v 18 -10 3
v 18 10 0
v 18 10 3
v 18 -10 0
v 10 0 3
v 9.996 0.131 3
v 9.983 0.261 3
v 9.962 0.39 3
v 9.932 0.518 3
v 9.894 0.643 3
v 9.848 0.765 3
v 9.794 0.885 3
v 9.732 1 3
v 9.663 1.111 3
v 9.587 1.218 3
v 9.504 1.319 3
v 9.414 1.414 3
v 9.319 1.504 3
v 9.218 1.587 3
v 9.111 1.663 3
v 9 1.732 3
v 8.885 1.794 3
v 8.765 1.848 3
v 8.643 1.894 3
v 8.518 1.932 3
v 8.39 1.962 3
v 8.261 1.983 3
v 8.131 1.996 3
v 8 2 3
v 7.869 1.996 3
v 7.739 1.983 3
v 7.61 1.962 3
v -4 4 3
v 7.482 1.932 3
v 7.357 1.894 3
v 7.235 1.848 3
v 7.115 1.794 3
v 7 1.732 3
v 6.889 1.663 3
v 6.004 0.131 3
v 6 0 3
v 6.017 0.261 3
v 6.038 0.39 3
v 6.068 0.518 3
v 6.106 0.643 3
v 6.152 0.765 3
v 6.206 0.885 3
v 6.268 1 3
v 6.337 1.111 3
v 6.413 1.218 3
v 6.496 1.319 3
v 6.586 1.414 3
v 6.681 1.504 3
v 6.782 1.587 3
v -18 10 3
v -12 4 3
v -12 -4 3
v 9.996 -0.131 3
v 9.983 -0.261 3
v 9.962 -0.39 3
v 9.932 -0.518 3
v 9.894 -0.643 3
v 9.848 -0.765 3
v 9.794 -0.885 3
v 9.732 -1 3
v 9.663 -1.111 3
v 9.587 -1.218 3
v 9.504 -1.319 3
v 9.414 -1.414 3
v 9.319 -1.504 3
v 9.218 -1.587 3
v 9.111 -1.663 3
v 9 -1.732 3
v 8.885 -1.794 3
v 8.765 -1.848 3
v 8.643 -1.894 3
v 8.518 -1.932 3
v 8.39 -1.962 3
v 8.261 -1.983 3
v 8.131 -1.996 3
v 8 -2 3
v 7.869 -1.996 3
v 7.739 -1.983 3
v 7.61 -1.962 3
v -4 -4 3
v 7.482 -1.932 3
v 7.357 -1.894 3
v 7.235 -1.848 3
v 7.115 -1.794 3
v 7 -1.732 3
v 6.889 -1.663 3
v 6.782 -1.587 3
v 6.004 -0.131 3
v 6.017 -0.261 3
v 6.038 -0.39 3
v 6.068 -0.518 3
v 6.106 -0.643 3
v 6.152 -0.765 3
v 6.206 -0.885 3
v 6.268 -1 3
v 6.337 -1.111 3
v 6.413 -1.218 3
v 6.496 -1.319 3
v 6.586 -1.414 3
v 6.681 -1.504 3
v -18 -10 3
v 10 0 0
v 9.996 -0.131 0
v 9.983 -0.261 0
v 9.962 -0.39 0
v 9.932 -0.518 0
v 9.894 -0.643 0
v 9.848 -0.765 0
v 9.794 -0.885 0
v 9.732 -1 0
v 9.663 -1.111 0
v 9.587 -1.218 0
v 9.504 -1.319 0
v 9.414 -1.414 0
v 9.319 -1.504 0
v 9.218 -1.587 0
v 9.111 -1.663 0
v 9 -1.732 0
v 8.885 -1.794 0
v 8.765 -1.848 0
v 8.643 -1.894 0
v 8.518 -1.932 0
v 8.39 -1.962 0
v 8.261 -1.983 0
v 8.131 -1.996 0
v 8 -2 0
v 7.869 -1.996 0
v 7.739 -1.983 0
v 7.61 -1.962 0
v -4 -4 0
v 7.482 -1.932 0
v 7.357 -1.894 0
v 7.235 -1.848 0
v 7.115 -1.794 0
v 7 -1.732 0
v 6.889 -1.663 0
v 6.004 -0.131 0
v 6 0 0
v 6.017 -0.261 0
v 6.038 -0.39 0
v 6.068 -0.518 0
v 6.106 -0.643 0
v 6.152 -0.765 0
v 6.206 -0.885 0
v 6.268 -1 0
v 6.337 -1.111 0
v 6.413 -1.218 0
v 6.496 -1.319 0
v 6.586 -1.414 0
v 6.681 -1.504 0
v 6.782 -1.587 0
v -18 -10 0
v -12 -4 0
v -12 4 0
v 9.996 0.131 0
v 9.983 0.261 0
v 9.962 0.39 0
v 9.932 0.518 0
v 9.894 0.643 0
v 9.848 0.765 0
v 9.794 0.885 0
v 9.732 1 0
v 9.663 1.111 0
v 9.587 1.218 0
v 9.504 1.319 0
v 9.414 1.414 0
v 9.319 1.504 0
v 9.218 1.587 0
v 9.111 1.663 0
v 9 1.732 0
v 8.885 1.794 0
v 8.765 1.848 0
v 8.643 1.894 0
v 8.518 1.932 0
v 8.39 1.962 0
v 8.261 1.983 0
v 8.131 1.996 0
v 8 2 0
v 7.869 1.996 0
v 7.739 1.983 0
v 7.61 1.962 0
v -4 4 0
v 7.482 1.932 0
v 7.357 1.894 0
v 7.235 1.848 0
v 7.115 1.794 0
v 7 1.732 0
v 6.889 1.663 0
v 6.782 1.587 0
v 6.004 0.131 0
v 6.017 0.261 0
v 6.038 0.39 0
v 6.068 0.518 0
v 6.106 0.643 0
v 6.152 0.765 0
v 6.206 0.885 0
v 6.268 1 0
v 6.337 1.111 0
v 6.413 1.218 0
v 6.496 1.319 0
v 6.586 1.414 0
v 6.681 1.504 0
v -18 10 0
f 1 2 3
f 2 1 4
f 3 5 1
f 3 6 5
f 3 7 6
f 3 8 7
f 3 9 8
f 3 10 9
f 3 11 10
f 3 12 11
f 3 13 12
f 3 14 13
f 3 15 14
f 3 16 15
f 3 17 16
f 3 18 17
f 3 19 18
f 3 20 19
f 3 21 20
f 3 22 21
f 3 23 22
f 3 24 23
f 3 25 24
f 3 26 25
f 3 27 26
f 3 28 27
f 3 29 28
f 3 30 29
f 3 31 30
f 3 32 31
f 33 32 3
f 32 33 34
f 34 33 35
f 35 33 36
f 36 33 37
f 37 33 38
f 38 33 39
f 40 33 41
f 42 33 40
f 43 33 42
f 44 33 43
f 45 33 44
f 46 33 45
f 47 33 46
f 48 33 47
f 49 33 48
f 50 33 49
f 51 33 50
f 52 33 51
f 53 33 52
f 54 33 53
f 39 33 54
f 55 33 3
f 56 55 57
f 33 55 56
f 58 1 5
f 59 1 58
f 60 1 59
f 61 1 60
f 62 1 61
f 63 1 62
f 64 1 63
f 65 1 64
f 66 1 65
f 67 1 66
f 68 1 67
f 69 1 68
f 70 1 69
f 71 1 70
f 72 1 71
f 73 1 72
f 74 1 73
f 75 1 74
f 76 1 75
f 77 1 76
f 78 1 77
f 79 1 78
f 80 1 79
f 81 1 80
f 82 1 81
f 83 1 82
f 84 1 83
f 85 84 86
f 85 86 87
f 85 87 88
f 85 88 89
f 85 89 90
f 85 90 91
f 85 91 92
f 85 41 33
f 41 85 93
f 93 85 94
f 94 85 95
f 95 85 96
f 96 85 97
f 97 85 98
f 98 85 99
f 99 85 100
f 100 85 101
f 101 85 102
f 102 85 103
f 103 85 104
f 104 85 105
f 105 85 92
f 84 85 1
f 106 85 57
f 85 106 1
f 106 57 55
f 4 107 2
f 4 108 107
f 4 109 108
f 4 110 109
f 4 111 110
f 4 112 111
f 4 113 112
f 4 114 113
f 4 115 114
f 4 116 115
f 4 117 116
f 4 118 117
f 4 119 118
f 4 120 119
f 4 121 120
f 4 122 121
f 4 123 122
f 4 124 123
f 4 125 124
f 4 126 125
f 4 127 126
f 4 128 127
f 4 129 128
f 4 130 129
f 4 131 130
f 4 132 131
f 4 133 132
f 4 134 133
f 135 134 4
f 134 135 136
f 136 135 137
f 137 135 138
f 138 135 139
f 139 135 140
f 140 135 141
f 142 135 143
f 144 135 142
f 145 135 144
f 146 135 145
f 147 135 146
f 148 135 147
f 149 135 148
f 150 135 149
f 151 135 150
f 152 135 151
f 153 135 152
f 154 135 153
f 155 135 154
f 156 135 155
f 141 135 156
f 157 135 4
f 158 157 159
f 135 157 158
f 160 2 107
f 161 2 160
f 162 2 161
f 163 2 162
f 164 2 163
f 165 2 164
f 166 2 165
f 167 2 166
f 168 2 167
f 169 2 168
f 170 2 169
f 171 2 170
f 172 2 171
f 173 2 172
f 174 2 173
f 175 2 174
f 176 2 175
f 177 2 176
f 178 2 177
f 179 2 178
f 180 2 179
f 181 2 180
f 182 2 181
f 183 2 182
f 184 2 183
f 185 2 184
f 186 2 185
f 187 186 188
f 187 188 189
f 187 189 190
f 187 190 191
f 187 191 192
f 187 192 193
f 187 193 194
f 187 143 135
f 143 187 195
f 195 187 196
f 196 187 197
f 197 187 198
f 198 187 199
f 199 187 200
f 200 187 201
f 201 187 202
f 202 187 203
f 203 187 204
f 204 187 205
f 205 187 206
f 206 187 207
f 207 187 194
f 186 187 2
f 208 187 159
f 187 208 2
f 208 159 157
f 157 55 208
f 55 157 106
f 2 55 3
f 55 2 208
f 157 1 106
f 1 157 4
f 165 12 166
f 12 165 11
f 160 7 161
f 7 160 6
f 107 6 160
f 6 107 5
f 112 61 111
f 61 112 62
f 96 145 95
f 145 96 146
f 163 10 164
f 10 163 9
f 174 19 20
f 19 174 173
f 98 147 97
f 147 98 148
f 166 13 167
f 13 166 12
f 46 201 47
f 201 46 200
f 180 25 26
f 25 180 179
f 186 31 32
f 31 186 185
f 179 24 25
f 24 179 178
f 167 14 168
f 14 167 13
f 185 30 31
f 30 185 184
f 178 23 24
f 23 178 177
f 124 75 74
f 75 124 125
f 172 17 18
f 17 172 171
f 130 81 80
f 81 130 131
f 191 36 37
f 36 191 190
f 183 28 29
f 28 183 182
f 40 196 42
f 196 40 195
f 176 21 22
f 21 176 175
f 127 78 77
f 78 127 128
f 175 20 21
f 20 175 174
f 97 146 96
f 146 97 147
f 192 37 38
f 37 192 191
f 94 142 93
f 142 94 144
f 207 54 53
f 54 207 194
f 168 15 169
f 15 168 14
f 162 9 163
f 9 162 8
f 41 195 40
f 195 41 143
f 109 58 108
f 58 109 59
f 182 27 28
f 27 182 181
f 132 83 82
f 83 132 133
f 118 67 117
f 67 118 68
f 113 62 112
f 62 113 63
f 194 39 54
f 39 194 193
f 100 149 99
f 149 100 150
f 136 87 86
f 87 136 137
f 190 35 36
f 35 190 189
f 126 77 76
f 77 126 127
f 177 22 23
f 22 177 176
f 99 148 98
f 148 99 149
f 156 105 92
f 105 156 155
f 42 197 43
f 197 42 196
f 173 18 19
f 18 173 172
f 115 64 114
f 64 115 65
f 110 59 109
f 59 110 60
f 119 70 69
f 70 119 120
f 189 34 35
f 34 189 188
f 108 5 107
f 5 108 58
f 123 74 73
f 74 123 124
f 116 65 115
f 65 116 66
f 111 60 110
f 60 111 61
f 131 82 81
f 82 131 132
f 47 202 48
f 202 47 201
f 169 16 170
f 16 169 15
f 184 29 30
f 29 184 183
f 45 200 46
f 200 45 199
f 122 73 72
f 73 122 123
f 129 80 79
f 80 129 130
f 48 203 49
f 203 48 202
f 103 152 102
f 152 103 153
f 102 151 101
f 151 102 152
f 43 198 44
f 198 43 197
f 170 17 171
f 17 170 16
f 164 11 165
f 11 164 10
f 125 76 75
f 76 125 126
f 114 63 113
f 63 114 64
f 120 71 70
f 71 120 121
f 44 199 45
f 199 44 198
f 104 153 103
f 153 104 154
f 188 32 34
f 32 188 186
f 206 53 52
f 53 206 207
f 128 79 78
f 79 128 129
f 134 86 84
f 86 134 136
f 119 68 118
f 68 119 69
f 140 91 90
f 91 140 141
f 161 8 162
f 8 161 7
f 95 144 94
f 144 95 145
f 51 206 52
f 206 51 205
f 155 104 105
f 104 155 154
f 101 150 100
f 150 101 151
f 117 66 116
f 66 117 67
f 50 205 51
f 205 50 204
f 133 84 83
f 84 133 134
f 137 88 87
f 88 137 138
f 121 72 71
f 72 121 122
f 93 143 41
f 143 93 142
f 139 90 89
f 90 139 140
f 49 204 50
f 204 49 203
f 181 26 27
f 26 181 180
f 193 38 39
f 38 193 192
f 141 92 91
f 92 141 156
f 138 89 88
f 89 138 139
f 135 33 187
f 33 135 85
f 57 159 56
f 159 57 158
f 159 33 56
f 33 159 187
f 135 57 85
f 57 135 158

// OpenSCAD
// Auto-generated from tests/data/feature_fixtures_manifest.json
// fixture: plate_cutout_and_hole
// fixture_type: plate
// description: Plate with one rectangular through-cutout and one separate round hole.
$fn = 96;

plate_size = [36.000000, 20.000000, 3.000000];
plate_origin = [-18.000000, -10.000000, 0.000000];

module through_hole(center, diameter, height) {
  translate(center) cylinder(d=diameter, h=height, center=false);
}

module through_slot(start, end, width, height) {
  hull() {
    through_hole(start, width, height);
    through_hole(end, width, height);
  }
}

module counterbore_hole(center, through_d, bore_d, bore_depth, plate_thickness) {
  translate([center[0], center[1], -0.1])
    cylinder(d=through_d, h=plate_thickness + 0.2, center=false);
  translate([center[0], center[1], plate_thickness - bore_depth])
    cylinder(d=bore_d, h=bore_depth + 0.1, center=false);
}

module rectangular_through_cutout(center, size_xy, plate_thickness) {
  translate([center[0] - size_xy[0] / 2, center[1] - size_xy[1] / 2, -0.1])
    cube([size_xy[0], size_xy[1], plate_thickness + 0.2]);
}

module rectangular_top_pocket(center, size_xy, pocket_depth, plate_thickness) {
  translate([center[0] - size_xy[0] / 2, center[1] - size_xy[1] / 2, plate_thickness - pocket_depth])
    cube([size_xy[0], size_xy[1], pocket_depth + 0.1]);
}

difference() {
  translate(plate_origin) cube(plate_size);
  through_hole([8.000000, 0.000000, -0.100000], 4.000000, 3.200000);  // hole_0
  rectangular_through_cutout([-8.000000, 0.000000, 0.000000], [8.000000, 8.000000], 3.000000);  // rectangular_cutout_0
}
